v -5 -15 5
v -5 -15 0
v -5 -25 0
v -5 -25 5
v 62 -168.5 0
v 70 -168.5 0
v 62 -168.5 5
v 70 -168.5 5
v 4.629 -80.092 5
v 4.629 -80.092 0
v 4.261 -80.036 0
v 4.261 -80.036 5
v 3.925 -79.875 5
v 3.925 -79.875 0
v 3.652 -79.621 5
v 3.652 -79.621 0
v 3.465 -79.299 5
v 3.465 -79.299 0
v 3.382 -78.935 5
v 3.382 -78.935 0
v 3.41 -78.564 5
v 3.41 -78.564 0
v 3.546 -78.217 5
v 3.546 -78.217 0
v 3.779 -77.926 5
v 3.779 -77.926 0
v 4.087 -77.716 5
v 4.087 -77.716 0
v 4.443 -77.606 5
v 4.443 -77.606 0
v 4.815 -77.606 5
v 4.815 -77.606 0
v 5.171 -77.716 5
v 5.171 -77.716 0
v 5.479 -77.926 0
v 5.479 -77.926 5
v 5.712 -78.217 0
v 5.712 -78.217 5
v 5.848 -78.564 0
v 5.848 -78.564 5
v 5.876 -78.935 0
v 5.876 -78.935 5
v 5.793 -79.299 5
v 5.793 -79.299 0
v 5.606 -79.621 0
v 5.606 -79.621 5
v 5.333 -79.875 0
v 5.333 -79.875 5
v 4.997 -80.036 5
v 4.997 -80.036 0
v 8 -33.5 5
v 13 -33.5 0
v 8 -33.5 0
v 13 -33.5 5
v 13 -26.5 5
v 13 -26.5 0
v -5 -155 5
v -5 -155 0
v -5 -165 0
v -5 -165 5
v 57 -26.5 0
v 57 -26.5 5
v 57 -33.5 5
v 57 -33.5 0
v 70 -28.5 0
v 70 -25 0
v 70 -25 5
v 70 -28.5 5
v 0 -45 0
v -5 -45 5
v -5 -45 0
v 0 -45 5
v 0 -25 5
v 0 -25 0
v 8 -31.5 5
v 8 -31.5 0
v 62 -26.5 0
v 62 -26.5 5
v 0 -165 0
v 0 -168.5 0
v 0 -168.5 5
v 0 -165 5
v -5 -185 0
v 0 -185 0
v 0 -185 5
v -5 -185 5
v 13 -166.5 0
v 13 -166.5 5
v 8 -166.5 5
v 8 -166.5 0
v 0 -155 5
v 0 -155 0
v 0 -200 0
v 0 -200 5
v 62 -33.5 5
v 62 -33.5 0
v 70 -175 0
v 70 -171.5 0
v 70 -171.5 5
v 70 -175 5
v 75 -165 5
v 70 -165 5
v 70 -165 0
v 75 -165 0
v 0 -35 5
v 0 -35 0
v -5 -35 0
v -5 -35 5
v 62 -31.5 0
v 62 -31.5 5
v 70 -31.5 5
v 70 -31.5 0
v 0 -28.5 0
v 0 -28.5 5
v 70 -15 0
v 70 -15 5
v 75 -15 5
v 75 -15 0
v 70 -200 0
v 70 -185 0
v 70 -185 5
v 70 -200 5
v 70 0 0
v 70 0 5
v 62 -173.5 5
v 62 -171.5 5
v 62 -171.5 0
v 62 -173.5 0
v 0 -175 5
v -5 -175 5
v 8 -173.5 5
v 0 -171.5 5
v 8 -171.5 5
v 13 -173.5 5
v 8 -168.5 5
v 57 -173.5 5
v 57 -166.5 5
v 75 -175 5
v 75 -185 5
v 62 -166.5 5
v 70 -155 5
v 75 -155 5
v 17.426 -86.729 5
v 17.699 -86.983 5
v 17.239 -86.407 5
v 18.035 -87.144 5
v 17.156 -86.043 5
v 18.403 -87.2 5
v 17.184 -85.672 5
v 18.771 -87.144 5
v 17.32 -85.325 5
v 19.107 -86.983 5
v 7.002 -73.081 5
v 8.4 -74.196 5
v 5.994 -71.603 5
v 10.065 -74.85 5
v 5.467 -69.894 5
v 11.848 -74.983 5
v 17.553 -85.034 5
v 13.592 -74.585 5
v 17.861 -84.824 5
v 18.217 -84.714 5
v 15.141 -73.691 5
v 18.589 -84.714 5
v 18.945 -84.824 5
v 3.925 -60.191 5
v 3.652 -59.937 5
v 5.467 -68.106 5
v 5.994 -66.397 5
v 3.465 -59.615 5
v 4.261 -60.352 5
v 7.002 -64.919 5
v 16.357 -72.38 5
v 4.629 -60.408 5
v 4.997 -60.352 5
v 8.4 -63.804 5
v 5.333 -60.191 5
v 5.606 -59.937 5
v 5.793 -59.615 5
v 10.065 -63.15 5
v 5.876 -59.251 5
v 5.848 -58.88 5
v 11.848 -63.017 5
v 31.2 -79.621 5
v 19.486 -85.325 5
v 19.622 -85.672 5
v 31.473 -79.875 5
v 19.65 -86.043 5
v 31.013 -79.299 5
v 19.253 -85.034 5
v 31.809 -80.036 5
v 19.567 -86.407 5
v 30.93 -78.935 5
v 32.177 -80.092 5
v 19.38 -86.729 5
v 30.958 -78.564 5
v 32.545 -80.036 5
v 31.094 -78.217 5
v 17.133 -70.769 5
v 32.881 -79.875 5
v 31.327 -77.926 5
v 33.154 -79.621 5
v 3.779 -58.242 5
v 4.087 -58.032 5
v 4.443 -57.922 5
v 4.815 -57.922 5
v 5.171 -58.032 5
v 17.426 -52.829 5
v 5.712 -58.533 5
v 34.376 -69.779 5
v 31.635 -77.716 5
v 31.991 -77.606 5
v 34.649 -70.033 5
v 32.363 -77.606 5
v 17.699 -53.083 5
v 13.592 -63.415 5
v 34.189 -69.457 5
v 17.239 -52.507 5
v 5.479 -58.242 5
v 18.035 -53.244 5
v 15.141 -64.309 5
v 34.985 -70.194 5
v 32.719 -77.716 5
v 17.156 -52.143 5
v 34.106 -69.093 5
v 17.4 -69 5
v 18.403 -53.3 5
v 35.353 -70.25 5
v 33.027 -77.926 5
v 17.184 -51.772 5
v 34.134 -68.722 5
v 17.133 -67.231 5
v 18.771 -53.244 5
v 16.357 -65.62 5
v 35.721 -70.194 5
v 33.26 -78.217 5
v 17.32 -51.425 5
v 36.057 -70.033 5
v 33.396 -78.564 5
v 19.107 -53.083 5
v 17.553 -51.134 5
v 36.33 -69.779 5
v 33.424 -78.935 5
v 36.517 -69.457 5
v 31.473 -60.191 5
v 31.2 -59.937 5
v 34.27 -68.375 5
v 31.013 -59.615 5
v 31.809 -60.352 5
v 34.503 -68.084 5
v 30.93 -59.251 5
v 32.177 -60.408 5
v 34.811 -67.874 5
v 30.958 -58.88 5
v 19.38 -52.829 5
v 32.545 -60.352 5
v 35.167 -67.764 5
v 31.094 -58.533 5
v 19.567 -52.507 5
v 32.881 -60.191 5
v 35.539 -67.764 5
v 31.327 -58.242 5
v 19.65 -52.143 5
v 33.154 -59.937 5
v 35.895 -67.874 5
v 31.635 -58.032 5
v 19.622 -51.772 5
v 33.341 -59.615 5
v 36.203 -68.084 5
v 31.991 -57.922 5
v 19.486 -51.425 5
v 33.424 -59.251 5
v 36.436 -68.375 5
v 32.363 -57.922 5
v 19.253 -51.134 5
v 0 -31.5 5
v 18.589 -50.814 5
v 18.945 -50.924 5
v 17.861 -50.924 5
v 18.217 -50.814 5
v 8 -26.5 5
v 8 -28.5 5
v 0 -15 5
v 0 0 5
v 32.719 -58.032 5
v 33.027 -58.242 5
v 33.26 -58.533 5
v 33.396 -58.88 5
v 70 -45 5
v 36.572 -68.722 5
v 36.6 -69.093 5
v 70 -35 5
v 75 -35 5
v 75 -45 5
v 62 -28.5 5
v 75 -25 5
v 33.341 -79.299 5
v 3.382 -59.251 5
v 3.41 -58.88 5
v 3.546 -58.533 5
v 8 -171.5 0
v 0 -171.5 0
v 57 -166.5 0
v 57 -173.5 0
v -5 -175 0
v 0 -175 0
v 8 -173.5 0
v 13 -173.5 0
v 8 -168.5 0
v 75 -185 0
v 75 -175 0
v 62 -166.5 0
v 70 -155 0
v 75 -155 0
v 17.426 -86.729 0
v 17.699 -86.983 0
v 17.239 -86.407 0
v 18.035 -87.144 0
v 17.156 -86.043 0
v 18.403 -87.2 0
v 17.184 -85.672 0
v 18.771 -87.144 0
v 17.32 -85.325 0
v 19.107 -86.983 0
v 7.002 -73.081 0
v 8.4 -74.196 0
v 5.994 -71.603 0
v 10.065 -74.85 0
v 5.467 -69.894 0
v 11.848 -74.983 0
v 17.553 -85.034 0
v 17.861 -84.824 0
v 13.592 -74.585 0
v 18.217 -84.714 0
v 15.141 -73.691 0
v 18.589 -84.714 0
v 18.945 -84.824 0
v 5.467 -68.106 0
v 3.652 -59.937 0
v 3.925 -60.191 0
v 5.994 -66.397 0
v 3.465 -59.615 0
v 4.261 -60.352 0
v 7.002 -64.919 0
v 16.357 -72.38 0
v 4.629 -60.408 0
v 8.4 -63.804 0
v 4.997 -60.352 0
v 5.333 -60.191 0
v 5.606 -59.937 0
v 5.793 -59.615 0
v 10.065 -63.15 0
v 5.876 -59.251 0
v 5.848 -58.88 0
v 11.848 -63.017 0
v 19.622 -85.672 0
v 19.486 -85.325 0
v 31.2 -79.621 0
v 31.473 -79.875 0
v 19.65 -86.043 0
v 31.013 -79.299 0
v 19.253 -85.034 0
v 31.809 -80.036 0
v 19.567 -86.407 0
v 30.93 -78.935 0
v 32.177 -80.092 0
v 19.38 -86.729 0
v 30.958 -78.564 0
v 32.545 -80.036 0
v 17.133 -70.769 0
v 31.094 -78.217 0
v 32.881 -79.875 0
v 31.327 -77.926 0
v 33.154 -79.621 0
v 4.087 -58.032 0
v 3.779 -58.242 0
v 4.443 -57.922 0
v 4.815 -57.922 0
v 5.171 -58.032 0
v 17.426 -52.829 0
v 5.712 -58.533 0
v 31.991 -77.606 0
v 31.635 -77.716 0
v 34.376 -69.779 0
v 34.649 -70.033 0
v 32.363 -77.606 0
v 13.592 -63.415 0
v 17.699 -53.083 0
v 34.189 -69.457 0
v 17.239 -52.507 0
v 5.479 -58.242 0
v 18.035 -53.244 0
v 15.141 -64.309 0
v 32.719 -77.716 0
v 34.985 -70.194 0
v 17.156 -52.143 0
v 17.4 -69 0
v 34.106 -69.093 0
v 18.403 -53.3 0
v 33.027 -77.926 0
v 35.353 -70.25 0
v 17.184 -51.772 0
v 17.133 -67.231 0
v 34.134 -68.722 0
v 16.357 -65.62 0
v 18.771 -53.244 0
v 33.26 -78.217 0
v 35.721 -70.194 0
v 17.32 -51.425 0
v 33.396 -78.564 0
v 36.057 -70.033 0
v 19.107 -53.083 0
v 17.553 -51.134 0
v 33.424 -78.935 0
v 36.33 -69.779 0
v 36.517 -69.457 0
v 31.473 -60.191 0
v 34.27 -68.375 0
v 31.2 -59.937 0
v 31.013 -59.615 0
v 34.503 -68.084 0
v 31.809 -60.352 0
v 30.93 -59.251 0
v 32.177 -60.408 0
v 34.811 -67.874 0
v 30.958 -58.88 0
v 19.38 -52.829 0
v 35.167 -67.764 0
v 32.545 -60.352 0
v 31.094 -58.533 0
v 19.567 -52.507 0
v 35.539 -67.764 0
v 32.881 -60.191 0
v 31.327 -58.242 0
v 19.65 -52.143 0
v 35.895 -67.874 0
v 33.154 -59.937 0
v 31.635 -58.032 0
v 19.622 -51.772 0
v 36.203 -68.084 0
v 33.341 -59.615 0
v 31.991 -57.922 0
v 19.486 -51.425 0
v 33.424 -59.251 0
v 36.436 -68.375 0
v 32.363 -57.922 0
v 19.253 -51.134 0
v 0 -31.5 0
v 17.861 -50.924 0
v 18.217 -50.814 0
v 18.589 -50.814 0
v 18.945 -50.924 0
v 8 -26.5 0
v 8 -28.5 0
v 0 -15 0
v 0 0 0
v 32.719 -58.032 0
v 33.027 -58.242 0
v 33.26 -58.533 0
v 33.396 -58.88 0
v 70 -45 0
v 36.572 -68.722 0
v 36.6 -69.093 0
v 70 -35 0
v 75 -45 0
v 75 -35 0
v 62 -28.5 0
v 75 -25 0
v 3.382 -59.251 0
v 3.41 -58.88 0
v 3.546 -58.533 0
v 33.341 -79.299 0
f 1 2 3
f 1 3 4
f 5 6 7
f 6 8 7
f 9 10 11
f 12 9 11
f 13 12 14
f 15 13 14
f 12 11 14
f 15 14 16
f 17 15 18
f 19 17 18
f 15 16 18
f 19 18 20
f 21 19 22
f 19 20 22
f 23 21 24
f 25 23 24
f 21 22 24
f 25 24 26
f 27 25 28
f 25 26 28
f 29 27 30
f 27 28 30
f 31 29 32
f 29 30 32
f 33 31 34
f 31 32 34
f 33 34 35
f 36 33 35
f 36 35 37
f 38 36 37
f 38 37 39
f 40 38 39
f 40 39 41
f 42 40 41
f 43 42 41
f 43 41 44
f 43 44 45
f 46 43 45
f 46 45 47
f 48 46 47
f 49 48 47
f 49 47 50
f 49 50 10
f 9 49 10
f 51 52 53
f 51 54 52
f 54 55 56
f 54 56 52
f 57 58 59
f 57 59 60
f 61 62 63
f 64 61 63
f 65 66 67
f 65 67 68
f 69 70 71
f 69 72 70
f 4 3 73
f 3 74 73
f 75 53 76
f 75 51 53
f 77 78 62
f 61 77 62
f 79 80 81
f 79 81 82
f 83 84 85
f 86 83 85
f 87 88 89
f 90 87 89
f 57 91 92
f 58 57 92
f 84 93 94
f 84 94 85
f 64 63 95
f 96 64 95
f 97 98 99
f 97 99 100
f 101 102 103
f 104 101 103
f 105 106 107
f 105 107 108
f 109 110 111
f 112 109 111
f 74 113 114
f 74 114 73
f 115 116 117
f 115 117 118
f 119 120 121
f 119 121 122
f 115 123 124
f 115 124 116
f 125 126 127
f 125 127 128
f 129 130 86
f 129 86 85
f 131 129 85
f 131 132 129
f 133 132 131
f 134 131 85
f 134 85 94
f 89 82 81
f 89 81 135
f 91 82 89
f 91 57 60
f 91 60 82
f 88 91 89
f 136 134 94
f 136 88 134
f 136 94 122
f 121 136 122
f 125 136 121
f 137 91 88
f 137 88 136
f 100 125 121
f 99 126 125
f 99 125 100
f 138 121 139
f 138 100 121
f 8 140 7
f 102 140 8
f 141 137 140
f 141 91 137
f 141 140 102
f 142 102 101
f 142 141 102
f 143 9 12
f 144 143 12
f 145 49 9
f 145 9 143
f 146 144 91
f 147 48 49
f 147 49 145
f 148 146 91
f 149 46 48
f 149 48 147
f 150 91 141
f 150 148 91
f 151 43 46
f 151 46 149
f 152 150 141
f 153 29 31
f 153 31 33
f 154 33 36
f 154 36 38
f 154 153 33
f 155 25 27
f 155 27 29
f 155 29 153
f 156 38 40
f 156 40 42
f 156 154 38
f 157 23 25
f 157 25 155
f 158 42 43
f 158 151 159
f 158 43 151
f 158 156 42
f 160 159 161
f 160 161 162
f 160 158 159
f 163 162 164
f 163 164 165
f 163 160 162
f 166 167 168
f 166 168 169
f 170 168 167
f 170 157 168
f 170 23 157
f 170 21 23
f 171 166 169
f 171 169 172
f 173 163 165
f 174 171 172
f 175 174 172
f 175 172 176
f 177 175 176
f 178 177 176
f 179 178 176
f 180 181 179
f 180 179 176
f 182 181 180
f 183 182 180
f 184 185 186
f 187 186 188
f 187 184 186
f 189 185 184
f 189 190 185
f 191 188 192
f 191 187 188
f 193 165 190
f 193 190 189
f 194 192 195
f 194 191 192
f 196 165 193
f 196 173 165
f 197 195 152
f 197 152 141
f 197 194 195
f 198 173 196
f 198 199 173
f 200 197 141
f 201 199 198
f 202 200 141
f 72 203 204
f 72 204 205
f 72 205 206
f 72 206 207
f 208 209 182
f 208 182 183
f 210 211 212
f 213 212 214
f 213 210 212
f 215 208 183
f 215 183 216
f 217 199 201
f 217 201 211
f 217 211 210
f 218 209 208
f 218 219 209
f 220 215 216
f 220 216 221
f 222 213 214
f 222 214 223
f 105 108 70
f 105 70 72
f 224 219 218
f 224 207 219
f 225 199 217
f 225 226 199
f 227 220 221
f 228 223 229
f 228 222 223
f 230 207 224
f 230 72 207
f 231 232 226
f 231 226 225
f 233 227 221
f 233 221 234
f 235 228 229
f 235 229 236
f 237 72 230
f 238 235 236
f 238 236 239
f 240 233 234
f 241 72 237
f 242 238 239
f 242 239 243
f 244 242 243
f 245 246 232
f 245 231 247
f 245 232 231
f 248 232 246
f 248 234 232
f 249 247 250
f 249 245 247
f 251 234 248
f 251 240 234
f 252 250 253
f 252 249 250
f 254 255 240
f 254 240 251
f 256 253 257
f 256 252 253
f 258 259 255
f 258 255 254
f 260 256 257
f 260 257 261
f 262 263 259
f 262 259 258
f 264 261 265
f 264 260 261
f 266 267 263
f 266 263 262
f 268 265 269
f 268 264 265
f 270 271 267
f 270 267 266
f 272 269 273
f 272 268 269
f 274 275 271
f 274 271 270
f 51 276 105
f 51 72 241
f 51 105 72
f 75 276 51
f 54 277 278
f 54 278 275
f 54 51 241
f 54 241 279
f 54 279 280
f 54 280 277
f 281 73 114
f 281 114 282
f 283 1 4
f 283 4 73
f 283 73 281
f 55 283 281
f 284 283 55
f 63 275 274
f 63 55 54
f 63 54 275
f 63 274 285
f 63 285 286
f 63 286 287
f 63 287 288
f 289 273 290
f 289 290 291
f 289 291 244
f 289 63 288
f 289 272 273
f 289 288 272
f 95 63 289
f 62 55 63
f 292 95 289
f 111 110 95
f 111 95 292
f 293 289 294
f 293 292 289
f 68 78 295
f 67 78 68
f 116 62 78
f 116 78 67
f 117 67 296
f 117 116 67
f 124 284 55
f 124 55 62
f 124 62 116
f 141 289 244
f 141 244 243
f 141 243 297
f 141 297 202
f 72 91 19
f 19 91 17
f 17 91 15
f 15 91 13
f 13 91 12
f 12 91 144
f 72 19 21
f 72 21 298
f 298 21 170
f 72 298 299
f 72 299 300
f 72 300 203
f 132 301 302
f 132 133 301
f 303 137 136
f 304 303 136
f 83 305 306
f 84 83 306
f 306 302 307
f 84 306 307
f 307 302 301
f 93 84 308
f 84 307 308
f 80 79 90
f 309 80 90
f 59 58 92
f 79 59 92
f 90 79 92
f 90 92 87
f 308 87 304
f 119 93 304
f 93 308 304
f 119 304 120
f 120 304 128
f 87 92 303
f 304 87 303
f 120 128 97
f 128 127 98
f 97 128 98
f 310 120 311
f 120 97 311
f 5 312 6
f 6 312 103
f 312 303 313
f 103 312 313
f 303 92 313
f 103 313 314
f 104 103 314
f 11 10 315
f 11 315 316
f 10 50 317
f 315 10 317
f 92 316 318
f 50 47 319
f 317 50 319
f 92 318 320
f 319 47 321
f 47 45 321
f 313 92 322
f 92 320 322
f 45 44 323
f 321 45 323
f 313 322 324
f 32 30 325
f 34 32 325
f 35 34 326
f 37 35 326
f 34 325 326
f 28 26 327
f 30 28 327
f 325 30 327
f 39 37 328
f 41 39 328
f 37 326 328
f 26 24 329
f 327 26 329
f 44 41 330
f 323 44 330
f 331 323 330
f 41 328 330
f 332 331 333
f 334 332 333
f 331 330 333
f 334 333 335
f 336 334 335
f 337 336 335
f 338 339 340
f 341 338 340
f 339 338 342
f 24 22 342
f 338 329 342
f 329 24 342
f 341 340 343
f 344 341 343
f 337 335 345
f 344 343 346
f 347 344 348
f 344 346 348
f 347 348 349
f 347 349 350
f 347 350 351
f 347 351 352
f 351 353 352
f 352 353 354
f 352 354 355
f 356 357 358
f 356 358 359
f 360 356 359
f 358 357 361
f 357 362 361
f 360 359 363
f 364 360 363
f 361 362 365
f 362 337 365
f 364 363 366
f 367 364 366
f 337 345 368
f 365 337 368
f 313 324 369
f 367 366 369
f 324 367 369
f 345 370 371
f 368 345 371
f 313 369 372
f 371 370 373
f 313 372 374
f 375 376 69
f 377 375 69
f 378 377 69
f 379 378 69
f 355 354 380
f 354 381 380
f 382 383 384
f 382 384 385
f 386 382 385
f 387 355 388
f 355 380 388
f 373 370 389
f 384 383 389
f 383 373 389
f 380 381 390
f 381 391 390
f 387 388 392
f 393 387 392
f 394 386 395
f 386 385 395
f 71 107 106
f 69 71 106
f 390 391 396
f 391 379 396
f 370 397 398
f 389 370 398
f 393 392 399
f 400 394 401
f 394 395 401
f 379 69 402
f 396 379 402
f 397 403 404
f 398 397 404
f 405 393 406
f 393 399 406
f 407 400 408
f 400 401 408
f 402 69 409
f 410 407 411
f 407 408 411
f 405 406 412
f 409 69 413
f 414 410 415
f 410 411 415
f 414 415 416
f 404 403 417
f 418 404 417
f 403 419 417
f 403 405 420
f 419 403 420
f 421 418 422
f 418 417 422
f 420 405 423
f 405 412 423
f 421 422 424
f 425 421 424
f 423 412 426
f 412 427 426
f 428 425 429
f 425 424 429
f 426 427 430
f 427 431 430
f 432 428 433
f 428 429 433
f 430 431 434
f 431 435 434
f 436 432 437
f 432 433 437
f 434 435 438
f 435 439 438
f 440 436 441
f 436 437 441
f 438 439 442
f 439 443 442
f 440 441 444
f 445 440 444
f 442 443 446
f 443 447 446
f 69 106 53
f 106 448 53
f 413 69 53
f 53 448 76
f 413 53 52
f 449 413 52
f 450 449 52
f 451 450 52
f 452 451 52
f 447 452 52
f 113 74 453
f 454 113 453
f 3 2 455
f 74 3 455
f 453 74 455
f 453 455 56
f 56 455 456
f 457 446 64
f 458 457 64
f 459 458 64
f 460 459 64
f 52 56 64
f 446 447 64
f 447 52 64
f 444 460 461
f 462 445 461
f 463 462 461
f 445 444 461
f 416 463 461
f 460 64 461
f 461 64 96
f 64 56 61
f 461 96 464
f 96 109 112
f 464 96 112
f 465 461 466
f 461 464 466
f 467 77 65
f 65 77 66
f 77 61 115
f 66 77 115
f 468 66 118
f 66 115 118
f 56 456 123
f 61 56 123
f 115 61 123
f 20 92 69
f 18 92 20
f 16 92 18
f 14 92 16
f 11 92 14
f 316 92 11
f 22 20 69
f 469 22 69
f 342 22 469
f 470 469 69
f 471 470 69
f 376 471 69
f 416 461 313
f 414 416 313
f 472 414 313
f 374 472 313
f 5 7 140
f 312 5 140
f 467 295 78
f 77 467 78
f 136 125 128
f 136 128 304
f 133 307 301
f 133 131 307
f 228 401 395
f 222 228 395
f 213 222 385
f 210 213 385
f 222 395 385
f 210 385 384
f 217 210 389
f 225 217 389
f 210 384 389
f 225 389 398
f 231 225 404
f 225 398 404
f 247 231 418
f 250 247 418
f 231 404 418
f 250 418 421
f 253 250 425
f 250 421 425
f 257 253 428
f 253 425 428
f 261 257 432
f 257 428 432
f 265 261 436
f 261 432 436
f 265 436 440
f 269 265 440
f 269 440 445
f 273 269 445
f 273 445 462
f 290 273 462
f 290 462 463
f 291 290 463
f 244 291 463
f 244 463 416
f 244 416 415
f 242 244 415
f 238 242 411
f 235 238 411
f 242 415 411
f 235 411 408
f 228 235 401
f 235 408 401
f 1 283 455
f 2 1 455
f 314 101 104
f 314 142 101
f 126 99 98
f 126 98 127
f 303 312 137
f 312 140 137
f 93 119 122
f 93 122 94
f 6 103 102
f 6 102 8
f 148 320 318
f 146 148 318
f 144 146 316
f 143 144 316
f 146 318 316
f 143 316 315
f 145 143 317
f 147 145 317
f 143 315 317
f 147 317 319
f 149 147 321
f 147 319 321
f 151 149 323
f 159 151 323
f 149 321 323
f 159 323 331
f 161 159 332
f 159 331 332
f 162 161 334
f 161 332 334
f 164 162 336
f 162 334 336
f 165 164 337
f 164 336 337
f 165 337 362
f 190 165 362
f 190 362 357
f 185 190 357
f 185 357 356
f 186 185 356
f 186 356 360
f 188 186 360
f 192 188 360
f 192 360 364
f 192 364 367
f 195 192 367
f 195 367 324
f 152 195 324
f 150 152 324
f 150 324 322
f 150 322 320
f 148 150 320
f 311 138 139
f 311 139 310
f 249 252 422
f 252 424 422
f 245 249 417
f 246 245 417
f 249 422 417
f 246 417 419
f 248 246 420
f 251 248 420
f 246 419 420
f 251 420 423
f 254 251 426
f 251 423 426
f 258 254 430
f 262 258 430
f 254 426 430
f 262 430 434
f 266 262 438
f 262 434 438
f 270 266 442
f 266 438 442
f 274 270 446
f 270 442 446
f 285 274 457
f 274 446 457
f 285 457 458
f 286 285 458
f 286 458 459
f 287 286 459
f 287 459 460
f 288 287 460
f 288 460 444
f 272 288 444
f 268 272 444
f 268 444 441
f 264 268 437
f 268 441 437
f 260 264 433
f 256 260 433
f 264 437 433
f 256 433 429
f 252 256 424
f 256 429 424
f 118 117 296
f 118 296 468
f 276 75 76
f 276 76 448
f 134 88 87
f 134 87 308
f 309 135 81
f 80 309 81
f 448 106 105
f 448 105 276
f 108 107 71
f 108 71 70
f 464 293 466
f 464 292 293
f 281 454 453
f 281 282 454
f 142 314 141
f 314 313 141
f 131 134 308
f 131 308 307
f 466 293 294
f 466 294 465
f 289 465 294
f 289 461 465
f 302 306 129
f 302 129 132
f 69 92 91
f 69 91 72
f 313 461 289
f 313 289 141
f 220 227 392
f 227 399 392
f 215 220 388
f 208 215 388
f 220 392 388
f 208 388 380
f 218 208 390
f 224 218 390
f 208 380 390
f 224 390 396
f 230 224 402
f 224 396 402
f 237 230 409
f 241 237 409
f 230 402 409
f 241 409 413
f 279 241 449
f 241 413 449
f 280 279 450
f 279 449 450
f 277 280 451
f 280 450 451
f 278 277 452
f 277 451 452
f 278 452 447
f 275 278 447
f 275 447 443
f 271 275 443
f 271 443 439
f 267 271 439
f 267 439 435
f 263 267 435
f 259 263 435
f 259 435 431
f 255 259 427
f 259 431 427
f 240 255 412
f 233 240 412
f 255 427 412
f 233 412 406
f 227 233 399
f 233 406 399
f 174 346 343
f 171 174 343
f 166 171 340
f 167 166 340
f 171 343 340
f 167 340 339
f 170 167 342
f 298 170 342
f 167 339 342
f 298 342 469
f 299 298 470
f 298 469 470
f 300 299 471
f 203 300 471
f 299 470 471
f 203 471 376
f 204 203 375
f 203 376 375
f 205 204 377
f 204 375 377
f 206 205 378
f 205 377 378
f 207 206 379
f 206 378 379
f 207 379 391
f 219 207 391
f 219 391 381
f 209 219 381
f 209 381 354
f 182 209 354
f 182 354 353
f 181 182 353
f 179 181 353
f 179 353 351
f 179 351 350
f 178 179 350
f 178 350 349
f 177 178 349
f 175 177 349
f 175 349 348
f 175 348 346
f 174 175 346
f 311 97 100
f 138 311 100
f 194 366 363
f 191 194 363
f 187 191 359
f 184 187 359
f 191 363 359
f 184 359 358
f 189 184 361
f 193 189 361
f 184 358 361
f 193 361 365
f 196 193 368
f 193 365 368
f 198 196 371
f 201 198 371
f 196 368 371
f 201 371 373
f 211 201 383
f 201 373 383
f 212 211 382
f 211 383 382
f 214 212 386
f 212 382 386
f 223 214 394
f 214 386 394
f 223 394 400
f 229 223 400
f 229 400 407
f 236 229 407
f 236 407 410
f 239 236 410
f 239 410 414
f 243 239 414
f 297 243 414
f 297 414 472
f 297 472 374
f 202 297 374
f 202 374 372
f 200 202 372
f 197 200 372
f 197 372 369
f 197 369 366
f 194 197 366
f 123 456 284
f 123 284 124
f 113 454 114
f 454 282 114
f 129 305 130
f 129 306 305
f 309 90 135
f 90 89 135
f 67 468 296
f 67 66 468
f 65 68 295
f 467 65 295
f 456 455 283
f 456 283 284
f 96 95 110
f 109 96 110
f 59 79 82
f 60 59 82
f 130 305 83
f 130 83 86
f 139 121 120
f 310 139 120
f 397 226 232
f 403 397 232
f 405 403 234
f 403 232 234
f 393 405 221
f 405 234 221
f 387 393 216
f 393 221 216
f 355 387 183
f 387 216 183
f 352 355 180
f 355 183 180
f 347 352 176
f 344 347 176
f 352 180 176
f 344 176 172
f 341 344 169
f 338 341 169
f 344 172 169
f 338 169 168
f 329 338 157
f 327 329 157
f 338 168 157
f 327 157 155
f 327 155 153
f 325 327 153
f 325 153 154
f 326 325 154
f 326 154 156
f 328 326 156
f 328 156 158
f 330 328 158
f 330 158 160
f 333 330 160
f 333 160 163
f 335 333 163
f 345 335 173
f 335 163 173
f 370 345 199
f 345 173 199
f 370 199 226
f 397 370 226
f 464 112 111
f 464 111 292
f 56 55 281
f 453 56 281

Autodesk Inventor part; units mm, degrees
ref_plane "YZ Plane" through (0, 0, 0) normal (1, 0, 0) x (0, 1, 0)
ref_plane "XZ Plane" through (0, 0, 0) normal (0, 1, 0) x (-1, 0, 0)
ref_plane "XY Plane" through (0, 0, 0) normal (0, 0, 1) x (1, 0, 0)
sketch "Sketch1" plane through (0, 0, 0) normal (0, 0, 1) x (1, 0, 0)
  line L0 (0, 0) -> (70, 0)
  line L1 (70, 0) -> (70, -200)
  line L2 (70, -200) -> (0, -200)
  line L3 (0, -200) -> (0, 0)
  dimension "d0" = 70
  dimension "d1" = 200
extrude "Extrusion1" add sketch "Sketch1" along normal blind 5
sketch "Sketch3" plane through (0, 0, 5) normal (0, 0, 1) x (1, 0, 0)
  line L0 (0, -0.5) -> (0, -3)
  line L1 (0, -3) -> (0, -30)
  line L2 (0, -3) -> (0, -2)
  line L3 (8, -1) -> (11, -1)
  line L4 (0, -30) -> (0, -28.5)
  line L5 (8, -28.5) -> (8, -26.5)
  line L6 (13, -26.5) -> (13, -33.5)
  line L7 (8, -33.5) -> (8, -31.5)
  line L8 (0, -31.5) -> (0, -30)
  line L9 (0, -30) -> (13, -30)
  line L10 (0, -30) -> (0, -60)
  line L11 (0, -60) -> (13, -60)
  line L12 (13, -60) -> (13, -56.5)
  line L13 (13, -56.5) -> (8, -56.5)
  line L14 (8, -56.5) -> (8, -58.5)
  line L15 (8, -58.5) -> (0, -58.5)
  line L16 (13, -60) -> (13, -63.5)
  line L17 (13, -63.5) -> (8, -63.5)
  line L18 (8, -63.5) -> (8, -61.5)
  line L19 (8, -61.5) -> (0, -61.5)
  line L20 (0, -60) -> (0, -90)
  line L21 (0, -90) -> (0, -170)
  line L22 (0, -170) -> (13, -170)
  line L23 (13, -170) -> (13, -166.5)
  line L24 (13, -166.5) -> (8, -166.5)
  line L25 (8, -166.5) -> (8, -168.5)
  line L26 (8, -168.5) -> (0, -168.5)
  line L27 (13, -170) -> (13, -173.5)
  line L28 (13, -173.5) -> (8, -173.5)
  line L29 (8, -173.5) -> (8, -171.5)
  line L30 (8, -171.5) -> (0, -171.5)
  line L31 (0, -171.5) -> (0, -170)
  line L32 (0, -91.5) -> (0, -90)
  line L33 (0, -61.5) -> (0, -60)
  line L34 (0, -31.5) -> (0, -30)
  line L35 (0, -4) -> (0, -3)
  line L36 (70, 0) -> (0, 0) projected
  line L37 (0, -30) -> (70, -30)
  line L38 (0, -60) -> (70, -60)
  line L39 (0, -170) -> (70, -170)
  line L40 (70, -60) -> (70, -58.5)
  line L41 (70, -58.5) -> (62, -58.5)
  line L42 (62, -58.5) -> (62, -56.5)
  line L43 (62, -56.5) -> (57, -56.5)
  line L44 (57, -56.5) -> (57, -60)
  line L45 (57, -60) -> (57, -63.5)
  line L46 (57, -63.5) -> (62, -63.5)
  line L47 (62, -63.5) -> (62, -61.5)
  line L48 (62, -61.5) -> (70, -61.5)
  line L49 (70, -61.5) -> (70, -60)
  line L50 (70, -170) -> (70, -168.5)
  line L51 (70, -168.5) -> (62, -168.5)
  line L52 (62, -168.5) -> (62, -166.5)
  line L53 (62, -166.5) -> (57, -166.5)
  line L54 (57, -166.5) -> (57, -170)
  line L55 (70, -170) -> (70, -171.5)
  line L56 (70, -171.5) -> (62, -171.5)
  line L57 (62, -171.5) -> (62, -173.5)
  line L58 (62, -173.5) -> (57, -173.5)
  line L59 (57, -173.5) -> (57, -170)
  line L60 (13, -33.5) -> (8, -33.5)
  line L61 (13, -26.5) -> (8, -26.5)
  line L62 (8, -28.5) -> (0, -28.5)
  line L63 (8, -31.5) -> (0, -31.5)
  line L64 (70, -28.5) -> (62, -28.5)
  line L65 (62, -28.5) -> (62, -26.5)
  line L66 (62, -26.5) -> (57, -26.5)
  line L67 (57, -26.5) -> (57, -30)
  line L68 (57, -30) -> (57, -33.5)
  line L69 (57, -33.5) -> (62, -33.5)
  line L70 (62, -33.5) -> (62, -31.5)
  line L71 (62, -31.5) -> (70, -31.5)
  line L72 (70, -28.5) -> (70, -30)
  line L73 (70, -30) -> (70, -31.5)
  line L74 (0, -0.5) -> (0, 0)
  dimension "d35" = 3
  dimension "d41" = 5
  dimension "d53" = 2
  dimension "d55" = 5
  dimension "d92" = 1.5
  dimension "d94" = 1.5
  dimension "d95" = 2
  dimension "d97" = 8
  dimension "d99" = 5
  dimension "d103" = 1.5
  dimension "d104" = 1.5
  dimension "d105" = 8
  dimension "d113" = 1.5
  dimension "d114" = 1.5
  dimension "d115" = 8
  dimension "d116" = 5
  dimension "d117" = 2
  dimension "d118" = 2
  dimension "d130" = 1.5
  dimension "d131" = 8
  dimension "d132" = 2
  dimension "d133" = 5
  dimension "d134" = 3.5
  dimension "d135" = 5
  dimension "d136" = 2
  dimension "d145" = 1.5
  dimension "d146" = 8
  dimension "d147" = 2
  dimension "d148" = 5
  dimension "d149" = 1.5
  dimension "d150" = 8
  dimension "d151" = 2
  dimension "d152" = 5
extrude "Extrusion3" cut sketch "Sketch3" against normal blind 5 contours L22 L27 L28 L29 L30 L31
extrude "Extrusion4" cut sketch "Sketch3" against normal blind 5 contours L26 L25 L24 L23 L22 L21
extrude "Extrusion14" cut sketch "Sketch3" against normal blind 5 contours L39 L55 L56 L57 L58 L59
extrude "Extrusion15" cut sketch "Sketch3" against normal blind 5 contours L54 L53 L52 L51 L50 L39
sketch "Sketch4" plane through (0, 0, 5) normal (0, 0, 1) x (1, 0, 0)
  line L0 (0, 0) -> (0, -19)
  circle A0 centre (11.4, -69) radius 6
  line L1 (17.4, -69) -> (34.103, -69)
  circle A1 centre (35.353, -69) radius 1.25
  line L2 (35.353, -69) -> (34.103, -69)
  line L3 (35.353, -69) -> (32.177, -69)
  line L4 (32.177, -69) -> (32.177, -78.842)
  line L5 (32.177, -69) -> (32.177, -59.158)
  circle A2 centre (32.177, -59.158) radius 1.25
  circle A3 centre (32.177, -78.842) radius 1.25
  line L6 (35.353, -69) -> (18.403, -69)
  line L7 (18.403, -69) -> (18.403, -85.95)
  line L8 (18.403, -69) -> (18.403, -52.05)
  circle A4 centre (18.403, -52.05) radius 1.25
  circle A5 centre (18.403, -85.95) radius 1.25
  line L9 (32.177, -59.158) -> (18.403, -52.05)
  line L10 (18.403, -69) -> (17.4, -69)
  line L11 (18.403, -69) -> (4.629, -69)
  line L12 (18.403, -52.05) -> (4.629, -59.158)
  circle A6 centre (4.629, -59.158) radius 1.25
  line L13 (4.629, -59.158) -> (4.629, -78.842)
  line L14 (18.403, -85.95) -> (4.629, -78.842)
  circle A7 centre (4.629, -78.842) radius 1.25
  line L15 (70, 0) -> (0, 0) projected
  dimension "d171" = 12
  dimension "d176" = 2.5
  dimension "d169" = 19
  dimension "d179" = 3.176
  dimension "d180" = 9.842
  dimension "d181" = 9.842
  dimension "d182" = 2.5
  dimension "d183" = 2.5
  dimension "d184" = 16.95
  dimension "d185" = 16.95
  dimension "d186" = 16.95
  dimension "d187" = 2.5
  dimension "d188" = 2.5
  dimension "d196" = 13.774
  dimension "d197" = 2.5
  dimension "d273" = 69
extrude "Extrusion22" cut sketch "Sketch4" against normal blind 5 contours L11 A0 | A0 L11
hole "Hole1" at (18.403, -85.95, 5) direction (0, 0, -1) diameter 2.5 end through all
hole "Hole2" at (4.629, -78.842, 5) at (4.629, -59.158, 5) at (4.629, -78.842, 5) direction (0, 0, -1) diameter 2.5 end through all
hole "Hole3" at (18.403, -52.05, 5) direction (0, 0, -1) diameter 2.5 end through all
hole "Hole4" at (32.177, -59.158, 5) direction (0, 0, -1) diameter 2.5 end through all
hole "Hole5" at (35.353, -69, 5) direction (0, 0, -1) diameter 2.5 end through all
hole "Hole6" at (32.177, -78.842, 5) direction (0, 0, -1) diameter 2.5 end through all
sketch "Sketch5" plane through (70, -200, 5) normal (1, 0, 0) x (0, 0, -1)
  line L0 (0, 0) -> (0, 15)
  line L1 (0, 15) -> (5, 15)
  line L2 (5, 15) -> (5, 25)
  line L3 (5, 25) -> (0, 25)
  line L4 (0, 25) -> (0, 15)
  line L5 (0, 25) -> (0, 35)
  line L6 (0, 35) -> (5, 35)
  line L7 (5, 35) -> (5, 45)
  line L8 (5, 45) -> (0, 45)
  line L9 (0, 45) -> (0, 35)
  line L10 (5, 200) -> (0, 200)
  line L11 (0, 185) -> (5, 185)
  line L12 (5, 185) -> (5, 175)
  line L13 (5, 175) -> (0, 175)
  line L14 (0, 175) -> (0, 185)
  line L15 (0, 175) -> (0, 165)
  line L16 (0, 165) -> (5, 165)
  line L17 (5, 165) -> (5, 155)
  line L18 (5, 155) -> (0, 155)
  line L19 (0, 155) -> (0, 165)
  dimension "d242" = 15
  dimension "d243" = 10
  dimension "d244" = 10
  dimension "d245" = 10
  dimension "d247" = 10
  dimension "d248" = 10
  dimension "d249" = 10
  dimension "d269" = 110
extrude "Extrusion26" add sketch "Sketch5" along normal blind 5
sketch "Sketch6" plane through (0, 0, 0) normal (-1, 0, 0) x (0, 0, 1)
  line L0 (0, 0) -> (0, -15)
  line L1 (0, -15) -> (0, -25)
  line L2 (0, -25) -> (5, -25)
  line L3 (5, -25) -> (5, -15)
  line L4 (5, -15) -> (0, -15)
  line L5 (0, -25) -> (0, -35)
  line L6 (0, -35) -> (5, -35)
  line L7 (5, -35) -> (5, -45)
  line L8 (5, -45) -> (0, -45)
  line L9 (0, -45) -> (0, -35)
  line L10 (5, -45) -> (5, -150)
  line L11 (5, -150) -> (5, -185)
  line L12 (0, -185) -> (0, -175)
  line L13 (0, -175) -> (0, -165)
  line L14 (0, -165) -> (5, -165)
  line L15 (5, -165) -> (5, -155)
  line L16 (5, -155) -> (0, -155)
  line L17 (0, -155) -> (0, -165)
  line L18 (5, -155) -> (5, -45)
  line L19 (0, -185) -> (5, -185)
  line L20 (0, -175) -> (5, -175)
  dimension "d253" = 10
  dimension "d254" = 5
  dimension "d255" = 10
  dimension "d256" = 10
  dimension "d259" = 10
  dimension "d260" = 10
  dimension "d261" = 10
  dimension "d266" = 110
extrude "Extrusion28" add sketch "Sketch6" along normal blind 5 contours L4 L3 L2 L1 | L11 L14 L17 L16 | L6 L7 L8 L9 | L11 L19 L12 L20
extrude "Extrusion30" cut sketch "Sketch3" against normal blind 5 contours L62 L5 L61 L6 L9 L1 | L67 L66 L65 L64 L72 L37 | L37 L73 L71 L70 L69 L68 | L9 L6 L60 L7 L63 L8
properties part number "lateral_mdf"
